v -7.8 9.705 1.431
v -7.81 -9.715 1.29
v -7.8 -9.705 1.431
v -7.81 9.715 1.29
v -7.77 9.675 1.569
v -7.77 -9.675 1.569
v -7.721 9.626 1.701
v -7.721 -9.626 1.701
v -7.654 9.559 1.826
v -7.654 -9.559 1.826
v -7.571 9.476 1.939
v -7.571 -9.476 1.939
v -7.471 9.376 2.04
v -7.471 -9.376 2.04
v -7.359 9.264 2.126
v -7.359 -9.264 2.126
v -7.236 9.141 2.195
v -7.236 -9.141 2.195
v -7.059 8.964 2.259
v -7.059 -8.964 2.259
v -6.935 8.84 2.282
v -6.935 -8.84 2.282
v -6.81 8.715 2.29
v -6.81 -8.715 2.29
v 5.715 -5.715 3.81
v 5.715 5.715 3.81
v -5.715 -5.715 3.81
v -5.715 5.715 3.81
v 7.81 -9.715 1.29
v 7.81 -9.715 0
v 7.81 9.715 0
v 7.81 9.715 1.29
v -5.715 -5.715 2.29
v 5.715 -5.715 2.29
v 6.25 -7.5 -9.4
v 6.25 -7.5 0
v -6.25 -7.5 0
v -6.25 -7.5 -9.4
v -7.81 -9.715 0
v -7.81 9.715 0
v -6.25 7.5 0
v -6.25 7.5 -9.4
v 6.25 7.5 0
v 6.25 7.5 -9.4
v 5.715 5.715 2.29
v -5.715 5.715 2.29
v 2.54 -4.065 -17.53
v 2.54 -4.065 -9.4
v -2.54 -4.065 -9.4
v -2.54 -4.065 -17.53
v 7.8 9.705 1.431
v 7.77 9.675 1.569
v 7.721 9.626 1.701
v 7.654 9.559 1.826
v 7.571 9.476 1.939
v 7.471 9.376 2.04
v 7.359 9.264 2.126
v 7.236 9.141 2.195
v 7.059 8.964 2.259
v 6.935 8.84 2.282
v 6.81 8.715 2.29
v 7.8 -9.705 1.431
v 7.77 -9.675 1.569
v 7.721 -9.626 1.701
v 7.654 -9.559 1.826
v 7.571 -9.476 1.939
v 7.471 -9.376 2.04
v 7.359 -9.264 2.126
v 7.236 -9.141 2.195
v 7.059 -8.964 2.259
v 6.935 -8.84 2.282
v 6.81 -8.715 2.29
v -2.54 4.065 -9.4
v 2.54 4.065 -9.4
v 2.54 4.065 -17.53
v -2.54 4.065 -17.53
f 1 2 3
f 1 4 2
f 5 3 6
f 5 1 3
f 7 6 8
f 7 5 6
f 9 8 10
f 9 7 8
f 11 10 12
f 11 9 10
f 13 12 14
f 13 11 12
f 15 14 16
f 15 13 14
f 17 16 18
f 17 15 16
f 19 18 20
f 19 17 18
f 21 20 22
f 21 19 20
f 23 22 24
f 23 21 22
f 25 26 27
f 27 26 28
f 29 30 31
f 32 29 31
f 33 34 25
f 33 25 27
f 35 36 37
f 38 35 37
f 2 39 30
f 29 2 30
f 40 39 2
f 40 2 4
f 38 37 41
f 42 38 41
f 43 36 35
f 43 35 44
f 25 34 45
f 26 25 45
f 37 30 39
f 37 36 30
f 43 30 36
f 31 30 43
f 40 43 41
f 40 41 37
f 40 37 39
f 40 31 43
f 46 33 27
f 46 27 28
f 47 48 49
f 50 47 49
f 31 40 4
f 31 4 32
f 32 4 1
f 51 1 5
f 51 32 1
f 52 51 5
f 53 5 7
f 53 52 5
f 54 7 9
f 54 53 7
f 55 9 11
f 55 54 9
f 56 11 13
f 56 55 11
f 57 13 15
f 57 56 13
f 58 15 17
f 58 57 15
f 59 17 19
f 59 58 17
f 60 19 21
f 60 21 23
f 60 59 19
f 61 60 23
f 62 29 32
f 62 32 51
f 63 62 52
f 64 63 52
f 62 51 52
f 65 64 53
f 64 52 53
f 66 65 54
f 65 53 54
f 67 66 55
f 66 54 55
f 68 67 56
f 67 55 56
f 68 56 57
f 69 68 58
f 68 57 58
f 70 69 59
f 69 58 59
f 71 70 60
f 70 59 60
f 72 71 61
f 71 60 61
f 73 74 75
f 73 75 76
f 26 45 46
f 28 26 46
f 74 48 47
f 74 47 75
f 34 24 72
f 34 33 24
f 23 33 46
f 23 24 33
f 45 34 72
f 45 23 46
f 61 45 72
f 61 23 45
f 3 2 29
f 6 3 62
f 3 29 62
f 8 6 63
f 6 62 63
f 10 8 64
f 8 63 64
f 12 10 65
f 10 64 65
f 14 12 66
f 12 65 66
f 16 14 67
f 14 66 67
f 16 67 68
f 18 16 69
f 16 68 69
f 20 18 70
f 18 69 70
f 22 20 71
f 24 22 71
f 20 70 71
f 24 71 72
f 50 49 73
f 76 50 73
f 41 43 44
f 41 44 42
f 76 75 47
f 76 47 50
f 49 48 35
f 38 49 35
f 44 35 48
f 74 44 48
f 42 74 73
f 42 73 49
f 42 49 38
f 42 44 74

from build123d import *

# Parameters (mm, degrees)
SKETCH1_W           = 15.62
SKETCH1_H           = 19.43
BOSS_EXTRUDE1_DEPTH = 2.29
SKETCH2_W           = 11.43
SKETCH2_H           = 11.43
BOSS_EXTRUDE2_DEPTH = 3.81
FILLET1_R           = 1
SKETCH3_W           = 12.5
SKETCH3_H           = 15
BOSS_EXTRUDE3_DEPTH = 9.4
SKETCH4_W           = 5.08
SKETCH4_H           = 8.13
BOSS_EXTRUDE4_DEPTH = 8.13


with BuildPart() as part:
    # Sketch1 → Boss-Extrude1 (new body)
    with BuildSketch(Plane.XY):
        Rectangle(SKETCH1_W, SKETCH1_H)
    extrude(amount=BOSS_EXTRUDE1_DEPTH)

    # Sketch2 → Boss-Extrude2 (add)
    with BuildSketch(Plane(origin=(0, 0, 0), x_dir=(-1, 0, 0), z_dir=(0, 0, -1))):
        Rectangle(SKETCH2_W, SKETCH2_H)
    extrude(amount=-BOSS_EXTRUDE2_DEPTH)

    # Fillet1
    fillet1_edges = [part.edges().sort_by_distance(p)[0] for p in [
        (-7.81, 0, 2.29),
        (0, -9.715, 2.29),
        (7.81, 0, 2.29),
        (0, 9.715, 2.29),
    ]]
    fillet(fillet1_edges, radius=FILLET1_R)

    # Sketch3 → Boss-Extrude3 (add)
    with BuildSketch(Plane(origin=(0, 0, 0), x_dir=(-1, 0, 0), z_dir=(0, 0, -1))):
        Rectangle(SKETCH3_W, SKETCH3_H)
    extrude(amount=BOSS_EXTRUDE3_DEPTH)

    # Sketch4 → Boss-Extrude4 (add)
    with BuildSketch(Plane(origin=(0, 0, -9.4), x_dir=(-1, 0, 0), z_dir=(0, 0, -1))):
        Rectangle(SKETCH4_W, SKETCH4_H)
    extrude(amount=BOSS_EXTRUDE4_DEPTH)


solid = part.part
